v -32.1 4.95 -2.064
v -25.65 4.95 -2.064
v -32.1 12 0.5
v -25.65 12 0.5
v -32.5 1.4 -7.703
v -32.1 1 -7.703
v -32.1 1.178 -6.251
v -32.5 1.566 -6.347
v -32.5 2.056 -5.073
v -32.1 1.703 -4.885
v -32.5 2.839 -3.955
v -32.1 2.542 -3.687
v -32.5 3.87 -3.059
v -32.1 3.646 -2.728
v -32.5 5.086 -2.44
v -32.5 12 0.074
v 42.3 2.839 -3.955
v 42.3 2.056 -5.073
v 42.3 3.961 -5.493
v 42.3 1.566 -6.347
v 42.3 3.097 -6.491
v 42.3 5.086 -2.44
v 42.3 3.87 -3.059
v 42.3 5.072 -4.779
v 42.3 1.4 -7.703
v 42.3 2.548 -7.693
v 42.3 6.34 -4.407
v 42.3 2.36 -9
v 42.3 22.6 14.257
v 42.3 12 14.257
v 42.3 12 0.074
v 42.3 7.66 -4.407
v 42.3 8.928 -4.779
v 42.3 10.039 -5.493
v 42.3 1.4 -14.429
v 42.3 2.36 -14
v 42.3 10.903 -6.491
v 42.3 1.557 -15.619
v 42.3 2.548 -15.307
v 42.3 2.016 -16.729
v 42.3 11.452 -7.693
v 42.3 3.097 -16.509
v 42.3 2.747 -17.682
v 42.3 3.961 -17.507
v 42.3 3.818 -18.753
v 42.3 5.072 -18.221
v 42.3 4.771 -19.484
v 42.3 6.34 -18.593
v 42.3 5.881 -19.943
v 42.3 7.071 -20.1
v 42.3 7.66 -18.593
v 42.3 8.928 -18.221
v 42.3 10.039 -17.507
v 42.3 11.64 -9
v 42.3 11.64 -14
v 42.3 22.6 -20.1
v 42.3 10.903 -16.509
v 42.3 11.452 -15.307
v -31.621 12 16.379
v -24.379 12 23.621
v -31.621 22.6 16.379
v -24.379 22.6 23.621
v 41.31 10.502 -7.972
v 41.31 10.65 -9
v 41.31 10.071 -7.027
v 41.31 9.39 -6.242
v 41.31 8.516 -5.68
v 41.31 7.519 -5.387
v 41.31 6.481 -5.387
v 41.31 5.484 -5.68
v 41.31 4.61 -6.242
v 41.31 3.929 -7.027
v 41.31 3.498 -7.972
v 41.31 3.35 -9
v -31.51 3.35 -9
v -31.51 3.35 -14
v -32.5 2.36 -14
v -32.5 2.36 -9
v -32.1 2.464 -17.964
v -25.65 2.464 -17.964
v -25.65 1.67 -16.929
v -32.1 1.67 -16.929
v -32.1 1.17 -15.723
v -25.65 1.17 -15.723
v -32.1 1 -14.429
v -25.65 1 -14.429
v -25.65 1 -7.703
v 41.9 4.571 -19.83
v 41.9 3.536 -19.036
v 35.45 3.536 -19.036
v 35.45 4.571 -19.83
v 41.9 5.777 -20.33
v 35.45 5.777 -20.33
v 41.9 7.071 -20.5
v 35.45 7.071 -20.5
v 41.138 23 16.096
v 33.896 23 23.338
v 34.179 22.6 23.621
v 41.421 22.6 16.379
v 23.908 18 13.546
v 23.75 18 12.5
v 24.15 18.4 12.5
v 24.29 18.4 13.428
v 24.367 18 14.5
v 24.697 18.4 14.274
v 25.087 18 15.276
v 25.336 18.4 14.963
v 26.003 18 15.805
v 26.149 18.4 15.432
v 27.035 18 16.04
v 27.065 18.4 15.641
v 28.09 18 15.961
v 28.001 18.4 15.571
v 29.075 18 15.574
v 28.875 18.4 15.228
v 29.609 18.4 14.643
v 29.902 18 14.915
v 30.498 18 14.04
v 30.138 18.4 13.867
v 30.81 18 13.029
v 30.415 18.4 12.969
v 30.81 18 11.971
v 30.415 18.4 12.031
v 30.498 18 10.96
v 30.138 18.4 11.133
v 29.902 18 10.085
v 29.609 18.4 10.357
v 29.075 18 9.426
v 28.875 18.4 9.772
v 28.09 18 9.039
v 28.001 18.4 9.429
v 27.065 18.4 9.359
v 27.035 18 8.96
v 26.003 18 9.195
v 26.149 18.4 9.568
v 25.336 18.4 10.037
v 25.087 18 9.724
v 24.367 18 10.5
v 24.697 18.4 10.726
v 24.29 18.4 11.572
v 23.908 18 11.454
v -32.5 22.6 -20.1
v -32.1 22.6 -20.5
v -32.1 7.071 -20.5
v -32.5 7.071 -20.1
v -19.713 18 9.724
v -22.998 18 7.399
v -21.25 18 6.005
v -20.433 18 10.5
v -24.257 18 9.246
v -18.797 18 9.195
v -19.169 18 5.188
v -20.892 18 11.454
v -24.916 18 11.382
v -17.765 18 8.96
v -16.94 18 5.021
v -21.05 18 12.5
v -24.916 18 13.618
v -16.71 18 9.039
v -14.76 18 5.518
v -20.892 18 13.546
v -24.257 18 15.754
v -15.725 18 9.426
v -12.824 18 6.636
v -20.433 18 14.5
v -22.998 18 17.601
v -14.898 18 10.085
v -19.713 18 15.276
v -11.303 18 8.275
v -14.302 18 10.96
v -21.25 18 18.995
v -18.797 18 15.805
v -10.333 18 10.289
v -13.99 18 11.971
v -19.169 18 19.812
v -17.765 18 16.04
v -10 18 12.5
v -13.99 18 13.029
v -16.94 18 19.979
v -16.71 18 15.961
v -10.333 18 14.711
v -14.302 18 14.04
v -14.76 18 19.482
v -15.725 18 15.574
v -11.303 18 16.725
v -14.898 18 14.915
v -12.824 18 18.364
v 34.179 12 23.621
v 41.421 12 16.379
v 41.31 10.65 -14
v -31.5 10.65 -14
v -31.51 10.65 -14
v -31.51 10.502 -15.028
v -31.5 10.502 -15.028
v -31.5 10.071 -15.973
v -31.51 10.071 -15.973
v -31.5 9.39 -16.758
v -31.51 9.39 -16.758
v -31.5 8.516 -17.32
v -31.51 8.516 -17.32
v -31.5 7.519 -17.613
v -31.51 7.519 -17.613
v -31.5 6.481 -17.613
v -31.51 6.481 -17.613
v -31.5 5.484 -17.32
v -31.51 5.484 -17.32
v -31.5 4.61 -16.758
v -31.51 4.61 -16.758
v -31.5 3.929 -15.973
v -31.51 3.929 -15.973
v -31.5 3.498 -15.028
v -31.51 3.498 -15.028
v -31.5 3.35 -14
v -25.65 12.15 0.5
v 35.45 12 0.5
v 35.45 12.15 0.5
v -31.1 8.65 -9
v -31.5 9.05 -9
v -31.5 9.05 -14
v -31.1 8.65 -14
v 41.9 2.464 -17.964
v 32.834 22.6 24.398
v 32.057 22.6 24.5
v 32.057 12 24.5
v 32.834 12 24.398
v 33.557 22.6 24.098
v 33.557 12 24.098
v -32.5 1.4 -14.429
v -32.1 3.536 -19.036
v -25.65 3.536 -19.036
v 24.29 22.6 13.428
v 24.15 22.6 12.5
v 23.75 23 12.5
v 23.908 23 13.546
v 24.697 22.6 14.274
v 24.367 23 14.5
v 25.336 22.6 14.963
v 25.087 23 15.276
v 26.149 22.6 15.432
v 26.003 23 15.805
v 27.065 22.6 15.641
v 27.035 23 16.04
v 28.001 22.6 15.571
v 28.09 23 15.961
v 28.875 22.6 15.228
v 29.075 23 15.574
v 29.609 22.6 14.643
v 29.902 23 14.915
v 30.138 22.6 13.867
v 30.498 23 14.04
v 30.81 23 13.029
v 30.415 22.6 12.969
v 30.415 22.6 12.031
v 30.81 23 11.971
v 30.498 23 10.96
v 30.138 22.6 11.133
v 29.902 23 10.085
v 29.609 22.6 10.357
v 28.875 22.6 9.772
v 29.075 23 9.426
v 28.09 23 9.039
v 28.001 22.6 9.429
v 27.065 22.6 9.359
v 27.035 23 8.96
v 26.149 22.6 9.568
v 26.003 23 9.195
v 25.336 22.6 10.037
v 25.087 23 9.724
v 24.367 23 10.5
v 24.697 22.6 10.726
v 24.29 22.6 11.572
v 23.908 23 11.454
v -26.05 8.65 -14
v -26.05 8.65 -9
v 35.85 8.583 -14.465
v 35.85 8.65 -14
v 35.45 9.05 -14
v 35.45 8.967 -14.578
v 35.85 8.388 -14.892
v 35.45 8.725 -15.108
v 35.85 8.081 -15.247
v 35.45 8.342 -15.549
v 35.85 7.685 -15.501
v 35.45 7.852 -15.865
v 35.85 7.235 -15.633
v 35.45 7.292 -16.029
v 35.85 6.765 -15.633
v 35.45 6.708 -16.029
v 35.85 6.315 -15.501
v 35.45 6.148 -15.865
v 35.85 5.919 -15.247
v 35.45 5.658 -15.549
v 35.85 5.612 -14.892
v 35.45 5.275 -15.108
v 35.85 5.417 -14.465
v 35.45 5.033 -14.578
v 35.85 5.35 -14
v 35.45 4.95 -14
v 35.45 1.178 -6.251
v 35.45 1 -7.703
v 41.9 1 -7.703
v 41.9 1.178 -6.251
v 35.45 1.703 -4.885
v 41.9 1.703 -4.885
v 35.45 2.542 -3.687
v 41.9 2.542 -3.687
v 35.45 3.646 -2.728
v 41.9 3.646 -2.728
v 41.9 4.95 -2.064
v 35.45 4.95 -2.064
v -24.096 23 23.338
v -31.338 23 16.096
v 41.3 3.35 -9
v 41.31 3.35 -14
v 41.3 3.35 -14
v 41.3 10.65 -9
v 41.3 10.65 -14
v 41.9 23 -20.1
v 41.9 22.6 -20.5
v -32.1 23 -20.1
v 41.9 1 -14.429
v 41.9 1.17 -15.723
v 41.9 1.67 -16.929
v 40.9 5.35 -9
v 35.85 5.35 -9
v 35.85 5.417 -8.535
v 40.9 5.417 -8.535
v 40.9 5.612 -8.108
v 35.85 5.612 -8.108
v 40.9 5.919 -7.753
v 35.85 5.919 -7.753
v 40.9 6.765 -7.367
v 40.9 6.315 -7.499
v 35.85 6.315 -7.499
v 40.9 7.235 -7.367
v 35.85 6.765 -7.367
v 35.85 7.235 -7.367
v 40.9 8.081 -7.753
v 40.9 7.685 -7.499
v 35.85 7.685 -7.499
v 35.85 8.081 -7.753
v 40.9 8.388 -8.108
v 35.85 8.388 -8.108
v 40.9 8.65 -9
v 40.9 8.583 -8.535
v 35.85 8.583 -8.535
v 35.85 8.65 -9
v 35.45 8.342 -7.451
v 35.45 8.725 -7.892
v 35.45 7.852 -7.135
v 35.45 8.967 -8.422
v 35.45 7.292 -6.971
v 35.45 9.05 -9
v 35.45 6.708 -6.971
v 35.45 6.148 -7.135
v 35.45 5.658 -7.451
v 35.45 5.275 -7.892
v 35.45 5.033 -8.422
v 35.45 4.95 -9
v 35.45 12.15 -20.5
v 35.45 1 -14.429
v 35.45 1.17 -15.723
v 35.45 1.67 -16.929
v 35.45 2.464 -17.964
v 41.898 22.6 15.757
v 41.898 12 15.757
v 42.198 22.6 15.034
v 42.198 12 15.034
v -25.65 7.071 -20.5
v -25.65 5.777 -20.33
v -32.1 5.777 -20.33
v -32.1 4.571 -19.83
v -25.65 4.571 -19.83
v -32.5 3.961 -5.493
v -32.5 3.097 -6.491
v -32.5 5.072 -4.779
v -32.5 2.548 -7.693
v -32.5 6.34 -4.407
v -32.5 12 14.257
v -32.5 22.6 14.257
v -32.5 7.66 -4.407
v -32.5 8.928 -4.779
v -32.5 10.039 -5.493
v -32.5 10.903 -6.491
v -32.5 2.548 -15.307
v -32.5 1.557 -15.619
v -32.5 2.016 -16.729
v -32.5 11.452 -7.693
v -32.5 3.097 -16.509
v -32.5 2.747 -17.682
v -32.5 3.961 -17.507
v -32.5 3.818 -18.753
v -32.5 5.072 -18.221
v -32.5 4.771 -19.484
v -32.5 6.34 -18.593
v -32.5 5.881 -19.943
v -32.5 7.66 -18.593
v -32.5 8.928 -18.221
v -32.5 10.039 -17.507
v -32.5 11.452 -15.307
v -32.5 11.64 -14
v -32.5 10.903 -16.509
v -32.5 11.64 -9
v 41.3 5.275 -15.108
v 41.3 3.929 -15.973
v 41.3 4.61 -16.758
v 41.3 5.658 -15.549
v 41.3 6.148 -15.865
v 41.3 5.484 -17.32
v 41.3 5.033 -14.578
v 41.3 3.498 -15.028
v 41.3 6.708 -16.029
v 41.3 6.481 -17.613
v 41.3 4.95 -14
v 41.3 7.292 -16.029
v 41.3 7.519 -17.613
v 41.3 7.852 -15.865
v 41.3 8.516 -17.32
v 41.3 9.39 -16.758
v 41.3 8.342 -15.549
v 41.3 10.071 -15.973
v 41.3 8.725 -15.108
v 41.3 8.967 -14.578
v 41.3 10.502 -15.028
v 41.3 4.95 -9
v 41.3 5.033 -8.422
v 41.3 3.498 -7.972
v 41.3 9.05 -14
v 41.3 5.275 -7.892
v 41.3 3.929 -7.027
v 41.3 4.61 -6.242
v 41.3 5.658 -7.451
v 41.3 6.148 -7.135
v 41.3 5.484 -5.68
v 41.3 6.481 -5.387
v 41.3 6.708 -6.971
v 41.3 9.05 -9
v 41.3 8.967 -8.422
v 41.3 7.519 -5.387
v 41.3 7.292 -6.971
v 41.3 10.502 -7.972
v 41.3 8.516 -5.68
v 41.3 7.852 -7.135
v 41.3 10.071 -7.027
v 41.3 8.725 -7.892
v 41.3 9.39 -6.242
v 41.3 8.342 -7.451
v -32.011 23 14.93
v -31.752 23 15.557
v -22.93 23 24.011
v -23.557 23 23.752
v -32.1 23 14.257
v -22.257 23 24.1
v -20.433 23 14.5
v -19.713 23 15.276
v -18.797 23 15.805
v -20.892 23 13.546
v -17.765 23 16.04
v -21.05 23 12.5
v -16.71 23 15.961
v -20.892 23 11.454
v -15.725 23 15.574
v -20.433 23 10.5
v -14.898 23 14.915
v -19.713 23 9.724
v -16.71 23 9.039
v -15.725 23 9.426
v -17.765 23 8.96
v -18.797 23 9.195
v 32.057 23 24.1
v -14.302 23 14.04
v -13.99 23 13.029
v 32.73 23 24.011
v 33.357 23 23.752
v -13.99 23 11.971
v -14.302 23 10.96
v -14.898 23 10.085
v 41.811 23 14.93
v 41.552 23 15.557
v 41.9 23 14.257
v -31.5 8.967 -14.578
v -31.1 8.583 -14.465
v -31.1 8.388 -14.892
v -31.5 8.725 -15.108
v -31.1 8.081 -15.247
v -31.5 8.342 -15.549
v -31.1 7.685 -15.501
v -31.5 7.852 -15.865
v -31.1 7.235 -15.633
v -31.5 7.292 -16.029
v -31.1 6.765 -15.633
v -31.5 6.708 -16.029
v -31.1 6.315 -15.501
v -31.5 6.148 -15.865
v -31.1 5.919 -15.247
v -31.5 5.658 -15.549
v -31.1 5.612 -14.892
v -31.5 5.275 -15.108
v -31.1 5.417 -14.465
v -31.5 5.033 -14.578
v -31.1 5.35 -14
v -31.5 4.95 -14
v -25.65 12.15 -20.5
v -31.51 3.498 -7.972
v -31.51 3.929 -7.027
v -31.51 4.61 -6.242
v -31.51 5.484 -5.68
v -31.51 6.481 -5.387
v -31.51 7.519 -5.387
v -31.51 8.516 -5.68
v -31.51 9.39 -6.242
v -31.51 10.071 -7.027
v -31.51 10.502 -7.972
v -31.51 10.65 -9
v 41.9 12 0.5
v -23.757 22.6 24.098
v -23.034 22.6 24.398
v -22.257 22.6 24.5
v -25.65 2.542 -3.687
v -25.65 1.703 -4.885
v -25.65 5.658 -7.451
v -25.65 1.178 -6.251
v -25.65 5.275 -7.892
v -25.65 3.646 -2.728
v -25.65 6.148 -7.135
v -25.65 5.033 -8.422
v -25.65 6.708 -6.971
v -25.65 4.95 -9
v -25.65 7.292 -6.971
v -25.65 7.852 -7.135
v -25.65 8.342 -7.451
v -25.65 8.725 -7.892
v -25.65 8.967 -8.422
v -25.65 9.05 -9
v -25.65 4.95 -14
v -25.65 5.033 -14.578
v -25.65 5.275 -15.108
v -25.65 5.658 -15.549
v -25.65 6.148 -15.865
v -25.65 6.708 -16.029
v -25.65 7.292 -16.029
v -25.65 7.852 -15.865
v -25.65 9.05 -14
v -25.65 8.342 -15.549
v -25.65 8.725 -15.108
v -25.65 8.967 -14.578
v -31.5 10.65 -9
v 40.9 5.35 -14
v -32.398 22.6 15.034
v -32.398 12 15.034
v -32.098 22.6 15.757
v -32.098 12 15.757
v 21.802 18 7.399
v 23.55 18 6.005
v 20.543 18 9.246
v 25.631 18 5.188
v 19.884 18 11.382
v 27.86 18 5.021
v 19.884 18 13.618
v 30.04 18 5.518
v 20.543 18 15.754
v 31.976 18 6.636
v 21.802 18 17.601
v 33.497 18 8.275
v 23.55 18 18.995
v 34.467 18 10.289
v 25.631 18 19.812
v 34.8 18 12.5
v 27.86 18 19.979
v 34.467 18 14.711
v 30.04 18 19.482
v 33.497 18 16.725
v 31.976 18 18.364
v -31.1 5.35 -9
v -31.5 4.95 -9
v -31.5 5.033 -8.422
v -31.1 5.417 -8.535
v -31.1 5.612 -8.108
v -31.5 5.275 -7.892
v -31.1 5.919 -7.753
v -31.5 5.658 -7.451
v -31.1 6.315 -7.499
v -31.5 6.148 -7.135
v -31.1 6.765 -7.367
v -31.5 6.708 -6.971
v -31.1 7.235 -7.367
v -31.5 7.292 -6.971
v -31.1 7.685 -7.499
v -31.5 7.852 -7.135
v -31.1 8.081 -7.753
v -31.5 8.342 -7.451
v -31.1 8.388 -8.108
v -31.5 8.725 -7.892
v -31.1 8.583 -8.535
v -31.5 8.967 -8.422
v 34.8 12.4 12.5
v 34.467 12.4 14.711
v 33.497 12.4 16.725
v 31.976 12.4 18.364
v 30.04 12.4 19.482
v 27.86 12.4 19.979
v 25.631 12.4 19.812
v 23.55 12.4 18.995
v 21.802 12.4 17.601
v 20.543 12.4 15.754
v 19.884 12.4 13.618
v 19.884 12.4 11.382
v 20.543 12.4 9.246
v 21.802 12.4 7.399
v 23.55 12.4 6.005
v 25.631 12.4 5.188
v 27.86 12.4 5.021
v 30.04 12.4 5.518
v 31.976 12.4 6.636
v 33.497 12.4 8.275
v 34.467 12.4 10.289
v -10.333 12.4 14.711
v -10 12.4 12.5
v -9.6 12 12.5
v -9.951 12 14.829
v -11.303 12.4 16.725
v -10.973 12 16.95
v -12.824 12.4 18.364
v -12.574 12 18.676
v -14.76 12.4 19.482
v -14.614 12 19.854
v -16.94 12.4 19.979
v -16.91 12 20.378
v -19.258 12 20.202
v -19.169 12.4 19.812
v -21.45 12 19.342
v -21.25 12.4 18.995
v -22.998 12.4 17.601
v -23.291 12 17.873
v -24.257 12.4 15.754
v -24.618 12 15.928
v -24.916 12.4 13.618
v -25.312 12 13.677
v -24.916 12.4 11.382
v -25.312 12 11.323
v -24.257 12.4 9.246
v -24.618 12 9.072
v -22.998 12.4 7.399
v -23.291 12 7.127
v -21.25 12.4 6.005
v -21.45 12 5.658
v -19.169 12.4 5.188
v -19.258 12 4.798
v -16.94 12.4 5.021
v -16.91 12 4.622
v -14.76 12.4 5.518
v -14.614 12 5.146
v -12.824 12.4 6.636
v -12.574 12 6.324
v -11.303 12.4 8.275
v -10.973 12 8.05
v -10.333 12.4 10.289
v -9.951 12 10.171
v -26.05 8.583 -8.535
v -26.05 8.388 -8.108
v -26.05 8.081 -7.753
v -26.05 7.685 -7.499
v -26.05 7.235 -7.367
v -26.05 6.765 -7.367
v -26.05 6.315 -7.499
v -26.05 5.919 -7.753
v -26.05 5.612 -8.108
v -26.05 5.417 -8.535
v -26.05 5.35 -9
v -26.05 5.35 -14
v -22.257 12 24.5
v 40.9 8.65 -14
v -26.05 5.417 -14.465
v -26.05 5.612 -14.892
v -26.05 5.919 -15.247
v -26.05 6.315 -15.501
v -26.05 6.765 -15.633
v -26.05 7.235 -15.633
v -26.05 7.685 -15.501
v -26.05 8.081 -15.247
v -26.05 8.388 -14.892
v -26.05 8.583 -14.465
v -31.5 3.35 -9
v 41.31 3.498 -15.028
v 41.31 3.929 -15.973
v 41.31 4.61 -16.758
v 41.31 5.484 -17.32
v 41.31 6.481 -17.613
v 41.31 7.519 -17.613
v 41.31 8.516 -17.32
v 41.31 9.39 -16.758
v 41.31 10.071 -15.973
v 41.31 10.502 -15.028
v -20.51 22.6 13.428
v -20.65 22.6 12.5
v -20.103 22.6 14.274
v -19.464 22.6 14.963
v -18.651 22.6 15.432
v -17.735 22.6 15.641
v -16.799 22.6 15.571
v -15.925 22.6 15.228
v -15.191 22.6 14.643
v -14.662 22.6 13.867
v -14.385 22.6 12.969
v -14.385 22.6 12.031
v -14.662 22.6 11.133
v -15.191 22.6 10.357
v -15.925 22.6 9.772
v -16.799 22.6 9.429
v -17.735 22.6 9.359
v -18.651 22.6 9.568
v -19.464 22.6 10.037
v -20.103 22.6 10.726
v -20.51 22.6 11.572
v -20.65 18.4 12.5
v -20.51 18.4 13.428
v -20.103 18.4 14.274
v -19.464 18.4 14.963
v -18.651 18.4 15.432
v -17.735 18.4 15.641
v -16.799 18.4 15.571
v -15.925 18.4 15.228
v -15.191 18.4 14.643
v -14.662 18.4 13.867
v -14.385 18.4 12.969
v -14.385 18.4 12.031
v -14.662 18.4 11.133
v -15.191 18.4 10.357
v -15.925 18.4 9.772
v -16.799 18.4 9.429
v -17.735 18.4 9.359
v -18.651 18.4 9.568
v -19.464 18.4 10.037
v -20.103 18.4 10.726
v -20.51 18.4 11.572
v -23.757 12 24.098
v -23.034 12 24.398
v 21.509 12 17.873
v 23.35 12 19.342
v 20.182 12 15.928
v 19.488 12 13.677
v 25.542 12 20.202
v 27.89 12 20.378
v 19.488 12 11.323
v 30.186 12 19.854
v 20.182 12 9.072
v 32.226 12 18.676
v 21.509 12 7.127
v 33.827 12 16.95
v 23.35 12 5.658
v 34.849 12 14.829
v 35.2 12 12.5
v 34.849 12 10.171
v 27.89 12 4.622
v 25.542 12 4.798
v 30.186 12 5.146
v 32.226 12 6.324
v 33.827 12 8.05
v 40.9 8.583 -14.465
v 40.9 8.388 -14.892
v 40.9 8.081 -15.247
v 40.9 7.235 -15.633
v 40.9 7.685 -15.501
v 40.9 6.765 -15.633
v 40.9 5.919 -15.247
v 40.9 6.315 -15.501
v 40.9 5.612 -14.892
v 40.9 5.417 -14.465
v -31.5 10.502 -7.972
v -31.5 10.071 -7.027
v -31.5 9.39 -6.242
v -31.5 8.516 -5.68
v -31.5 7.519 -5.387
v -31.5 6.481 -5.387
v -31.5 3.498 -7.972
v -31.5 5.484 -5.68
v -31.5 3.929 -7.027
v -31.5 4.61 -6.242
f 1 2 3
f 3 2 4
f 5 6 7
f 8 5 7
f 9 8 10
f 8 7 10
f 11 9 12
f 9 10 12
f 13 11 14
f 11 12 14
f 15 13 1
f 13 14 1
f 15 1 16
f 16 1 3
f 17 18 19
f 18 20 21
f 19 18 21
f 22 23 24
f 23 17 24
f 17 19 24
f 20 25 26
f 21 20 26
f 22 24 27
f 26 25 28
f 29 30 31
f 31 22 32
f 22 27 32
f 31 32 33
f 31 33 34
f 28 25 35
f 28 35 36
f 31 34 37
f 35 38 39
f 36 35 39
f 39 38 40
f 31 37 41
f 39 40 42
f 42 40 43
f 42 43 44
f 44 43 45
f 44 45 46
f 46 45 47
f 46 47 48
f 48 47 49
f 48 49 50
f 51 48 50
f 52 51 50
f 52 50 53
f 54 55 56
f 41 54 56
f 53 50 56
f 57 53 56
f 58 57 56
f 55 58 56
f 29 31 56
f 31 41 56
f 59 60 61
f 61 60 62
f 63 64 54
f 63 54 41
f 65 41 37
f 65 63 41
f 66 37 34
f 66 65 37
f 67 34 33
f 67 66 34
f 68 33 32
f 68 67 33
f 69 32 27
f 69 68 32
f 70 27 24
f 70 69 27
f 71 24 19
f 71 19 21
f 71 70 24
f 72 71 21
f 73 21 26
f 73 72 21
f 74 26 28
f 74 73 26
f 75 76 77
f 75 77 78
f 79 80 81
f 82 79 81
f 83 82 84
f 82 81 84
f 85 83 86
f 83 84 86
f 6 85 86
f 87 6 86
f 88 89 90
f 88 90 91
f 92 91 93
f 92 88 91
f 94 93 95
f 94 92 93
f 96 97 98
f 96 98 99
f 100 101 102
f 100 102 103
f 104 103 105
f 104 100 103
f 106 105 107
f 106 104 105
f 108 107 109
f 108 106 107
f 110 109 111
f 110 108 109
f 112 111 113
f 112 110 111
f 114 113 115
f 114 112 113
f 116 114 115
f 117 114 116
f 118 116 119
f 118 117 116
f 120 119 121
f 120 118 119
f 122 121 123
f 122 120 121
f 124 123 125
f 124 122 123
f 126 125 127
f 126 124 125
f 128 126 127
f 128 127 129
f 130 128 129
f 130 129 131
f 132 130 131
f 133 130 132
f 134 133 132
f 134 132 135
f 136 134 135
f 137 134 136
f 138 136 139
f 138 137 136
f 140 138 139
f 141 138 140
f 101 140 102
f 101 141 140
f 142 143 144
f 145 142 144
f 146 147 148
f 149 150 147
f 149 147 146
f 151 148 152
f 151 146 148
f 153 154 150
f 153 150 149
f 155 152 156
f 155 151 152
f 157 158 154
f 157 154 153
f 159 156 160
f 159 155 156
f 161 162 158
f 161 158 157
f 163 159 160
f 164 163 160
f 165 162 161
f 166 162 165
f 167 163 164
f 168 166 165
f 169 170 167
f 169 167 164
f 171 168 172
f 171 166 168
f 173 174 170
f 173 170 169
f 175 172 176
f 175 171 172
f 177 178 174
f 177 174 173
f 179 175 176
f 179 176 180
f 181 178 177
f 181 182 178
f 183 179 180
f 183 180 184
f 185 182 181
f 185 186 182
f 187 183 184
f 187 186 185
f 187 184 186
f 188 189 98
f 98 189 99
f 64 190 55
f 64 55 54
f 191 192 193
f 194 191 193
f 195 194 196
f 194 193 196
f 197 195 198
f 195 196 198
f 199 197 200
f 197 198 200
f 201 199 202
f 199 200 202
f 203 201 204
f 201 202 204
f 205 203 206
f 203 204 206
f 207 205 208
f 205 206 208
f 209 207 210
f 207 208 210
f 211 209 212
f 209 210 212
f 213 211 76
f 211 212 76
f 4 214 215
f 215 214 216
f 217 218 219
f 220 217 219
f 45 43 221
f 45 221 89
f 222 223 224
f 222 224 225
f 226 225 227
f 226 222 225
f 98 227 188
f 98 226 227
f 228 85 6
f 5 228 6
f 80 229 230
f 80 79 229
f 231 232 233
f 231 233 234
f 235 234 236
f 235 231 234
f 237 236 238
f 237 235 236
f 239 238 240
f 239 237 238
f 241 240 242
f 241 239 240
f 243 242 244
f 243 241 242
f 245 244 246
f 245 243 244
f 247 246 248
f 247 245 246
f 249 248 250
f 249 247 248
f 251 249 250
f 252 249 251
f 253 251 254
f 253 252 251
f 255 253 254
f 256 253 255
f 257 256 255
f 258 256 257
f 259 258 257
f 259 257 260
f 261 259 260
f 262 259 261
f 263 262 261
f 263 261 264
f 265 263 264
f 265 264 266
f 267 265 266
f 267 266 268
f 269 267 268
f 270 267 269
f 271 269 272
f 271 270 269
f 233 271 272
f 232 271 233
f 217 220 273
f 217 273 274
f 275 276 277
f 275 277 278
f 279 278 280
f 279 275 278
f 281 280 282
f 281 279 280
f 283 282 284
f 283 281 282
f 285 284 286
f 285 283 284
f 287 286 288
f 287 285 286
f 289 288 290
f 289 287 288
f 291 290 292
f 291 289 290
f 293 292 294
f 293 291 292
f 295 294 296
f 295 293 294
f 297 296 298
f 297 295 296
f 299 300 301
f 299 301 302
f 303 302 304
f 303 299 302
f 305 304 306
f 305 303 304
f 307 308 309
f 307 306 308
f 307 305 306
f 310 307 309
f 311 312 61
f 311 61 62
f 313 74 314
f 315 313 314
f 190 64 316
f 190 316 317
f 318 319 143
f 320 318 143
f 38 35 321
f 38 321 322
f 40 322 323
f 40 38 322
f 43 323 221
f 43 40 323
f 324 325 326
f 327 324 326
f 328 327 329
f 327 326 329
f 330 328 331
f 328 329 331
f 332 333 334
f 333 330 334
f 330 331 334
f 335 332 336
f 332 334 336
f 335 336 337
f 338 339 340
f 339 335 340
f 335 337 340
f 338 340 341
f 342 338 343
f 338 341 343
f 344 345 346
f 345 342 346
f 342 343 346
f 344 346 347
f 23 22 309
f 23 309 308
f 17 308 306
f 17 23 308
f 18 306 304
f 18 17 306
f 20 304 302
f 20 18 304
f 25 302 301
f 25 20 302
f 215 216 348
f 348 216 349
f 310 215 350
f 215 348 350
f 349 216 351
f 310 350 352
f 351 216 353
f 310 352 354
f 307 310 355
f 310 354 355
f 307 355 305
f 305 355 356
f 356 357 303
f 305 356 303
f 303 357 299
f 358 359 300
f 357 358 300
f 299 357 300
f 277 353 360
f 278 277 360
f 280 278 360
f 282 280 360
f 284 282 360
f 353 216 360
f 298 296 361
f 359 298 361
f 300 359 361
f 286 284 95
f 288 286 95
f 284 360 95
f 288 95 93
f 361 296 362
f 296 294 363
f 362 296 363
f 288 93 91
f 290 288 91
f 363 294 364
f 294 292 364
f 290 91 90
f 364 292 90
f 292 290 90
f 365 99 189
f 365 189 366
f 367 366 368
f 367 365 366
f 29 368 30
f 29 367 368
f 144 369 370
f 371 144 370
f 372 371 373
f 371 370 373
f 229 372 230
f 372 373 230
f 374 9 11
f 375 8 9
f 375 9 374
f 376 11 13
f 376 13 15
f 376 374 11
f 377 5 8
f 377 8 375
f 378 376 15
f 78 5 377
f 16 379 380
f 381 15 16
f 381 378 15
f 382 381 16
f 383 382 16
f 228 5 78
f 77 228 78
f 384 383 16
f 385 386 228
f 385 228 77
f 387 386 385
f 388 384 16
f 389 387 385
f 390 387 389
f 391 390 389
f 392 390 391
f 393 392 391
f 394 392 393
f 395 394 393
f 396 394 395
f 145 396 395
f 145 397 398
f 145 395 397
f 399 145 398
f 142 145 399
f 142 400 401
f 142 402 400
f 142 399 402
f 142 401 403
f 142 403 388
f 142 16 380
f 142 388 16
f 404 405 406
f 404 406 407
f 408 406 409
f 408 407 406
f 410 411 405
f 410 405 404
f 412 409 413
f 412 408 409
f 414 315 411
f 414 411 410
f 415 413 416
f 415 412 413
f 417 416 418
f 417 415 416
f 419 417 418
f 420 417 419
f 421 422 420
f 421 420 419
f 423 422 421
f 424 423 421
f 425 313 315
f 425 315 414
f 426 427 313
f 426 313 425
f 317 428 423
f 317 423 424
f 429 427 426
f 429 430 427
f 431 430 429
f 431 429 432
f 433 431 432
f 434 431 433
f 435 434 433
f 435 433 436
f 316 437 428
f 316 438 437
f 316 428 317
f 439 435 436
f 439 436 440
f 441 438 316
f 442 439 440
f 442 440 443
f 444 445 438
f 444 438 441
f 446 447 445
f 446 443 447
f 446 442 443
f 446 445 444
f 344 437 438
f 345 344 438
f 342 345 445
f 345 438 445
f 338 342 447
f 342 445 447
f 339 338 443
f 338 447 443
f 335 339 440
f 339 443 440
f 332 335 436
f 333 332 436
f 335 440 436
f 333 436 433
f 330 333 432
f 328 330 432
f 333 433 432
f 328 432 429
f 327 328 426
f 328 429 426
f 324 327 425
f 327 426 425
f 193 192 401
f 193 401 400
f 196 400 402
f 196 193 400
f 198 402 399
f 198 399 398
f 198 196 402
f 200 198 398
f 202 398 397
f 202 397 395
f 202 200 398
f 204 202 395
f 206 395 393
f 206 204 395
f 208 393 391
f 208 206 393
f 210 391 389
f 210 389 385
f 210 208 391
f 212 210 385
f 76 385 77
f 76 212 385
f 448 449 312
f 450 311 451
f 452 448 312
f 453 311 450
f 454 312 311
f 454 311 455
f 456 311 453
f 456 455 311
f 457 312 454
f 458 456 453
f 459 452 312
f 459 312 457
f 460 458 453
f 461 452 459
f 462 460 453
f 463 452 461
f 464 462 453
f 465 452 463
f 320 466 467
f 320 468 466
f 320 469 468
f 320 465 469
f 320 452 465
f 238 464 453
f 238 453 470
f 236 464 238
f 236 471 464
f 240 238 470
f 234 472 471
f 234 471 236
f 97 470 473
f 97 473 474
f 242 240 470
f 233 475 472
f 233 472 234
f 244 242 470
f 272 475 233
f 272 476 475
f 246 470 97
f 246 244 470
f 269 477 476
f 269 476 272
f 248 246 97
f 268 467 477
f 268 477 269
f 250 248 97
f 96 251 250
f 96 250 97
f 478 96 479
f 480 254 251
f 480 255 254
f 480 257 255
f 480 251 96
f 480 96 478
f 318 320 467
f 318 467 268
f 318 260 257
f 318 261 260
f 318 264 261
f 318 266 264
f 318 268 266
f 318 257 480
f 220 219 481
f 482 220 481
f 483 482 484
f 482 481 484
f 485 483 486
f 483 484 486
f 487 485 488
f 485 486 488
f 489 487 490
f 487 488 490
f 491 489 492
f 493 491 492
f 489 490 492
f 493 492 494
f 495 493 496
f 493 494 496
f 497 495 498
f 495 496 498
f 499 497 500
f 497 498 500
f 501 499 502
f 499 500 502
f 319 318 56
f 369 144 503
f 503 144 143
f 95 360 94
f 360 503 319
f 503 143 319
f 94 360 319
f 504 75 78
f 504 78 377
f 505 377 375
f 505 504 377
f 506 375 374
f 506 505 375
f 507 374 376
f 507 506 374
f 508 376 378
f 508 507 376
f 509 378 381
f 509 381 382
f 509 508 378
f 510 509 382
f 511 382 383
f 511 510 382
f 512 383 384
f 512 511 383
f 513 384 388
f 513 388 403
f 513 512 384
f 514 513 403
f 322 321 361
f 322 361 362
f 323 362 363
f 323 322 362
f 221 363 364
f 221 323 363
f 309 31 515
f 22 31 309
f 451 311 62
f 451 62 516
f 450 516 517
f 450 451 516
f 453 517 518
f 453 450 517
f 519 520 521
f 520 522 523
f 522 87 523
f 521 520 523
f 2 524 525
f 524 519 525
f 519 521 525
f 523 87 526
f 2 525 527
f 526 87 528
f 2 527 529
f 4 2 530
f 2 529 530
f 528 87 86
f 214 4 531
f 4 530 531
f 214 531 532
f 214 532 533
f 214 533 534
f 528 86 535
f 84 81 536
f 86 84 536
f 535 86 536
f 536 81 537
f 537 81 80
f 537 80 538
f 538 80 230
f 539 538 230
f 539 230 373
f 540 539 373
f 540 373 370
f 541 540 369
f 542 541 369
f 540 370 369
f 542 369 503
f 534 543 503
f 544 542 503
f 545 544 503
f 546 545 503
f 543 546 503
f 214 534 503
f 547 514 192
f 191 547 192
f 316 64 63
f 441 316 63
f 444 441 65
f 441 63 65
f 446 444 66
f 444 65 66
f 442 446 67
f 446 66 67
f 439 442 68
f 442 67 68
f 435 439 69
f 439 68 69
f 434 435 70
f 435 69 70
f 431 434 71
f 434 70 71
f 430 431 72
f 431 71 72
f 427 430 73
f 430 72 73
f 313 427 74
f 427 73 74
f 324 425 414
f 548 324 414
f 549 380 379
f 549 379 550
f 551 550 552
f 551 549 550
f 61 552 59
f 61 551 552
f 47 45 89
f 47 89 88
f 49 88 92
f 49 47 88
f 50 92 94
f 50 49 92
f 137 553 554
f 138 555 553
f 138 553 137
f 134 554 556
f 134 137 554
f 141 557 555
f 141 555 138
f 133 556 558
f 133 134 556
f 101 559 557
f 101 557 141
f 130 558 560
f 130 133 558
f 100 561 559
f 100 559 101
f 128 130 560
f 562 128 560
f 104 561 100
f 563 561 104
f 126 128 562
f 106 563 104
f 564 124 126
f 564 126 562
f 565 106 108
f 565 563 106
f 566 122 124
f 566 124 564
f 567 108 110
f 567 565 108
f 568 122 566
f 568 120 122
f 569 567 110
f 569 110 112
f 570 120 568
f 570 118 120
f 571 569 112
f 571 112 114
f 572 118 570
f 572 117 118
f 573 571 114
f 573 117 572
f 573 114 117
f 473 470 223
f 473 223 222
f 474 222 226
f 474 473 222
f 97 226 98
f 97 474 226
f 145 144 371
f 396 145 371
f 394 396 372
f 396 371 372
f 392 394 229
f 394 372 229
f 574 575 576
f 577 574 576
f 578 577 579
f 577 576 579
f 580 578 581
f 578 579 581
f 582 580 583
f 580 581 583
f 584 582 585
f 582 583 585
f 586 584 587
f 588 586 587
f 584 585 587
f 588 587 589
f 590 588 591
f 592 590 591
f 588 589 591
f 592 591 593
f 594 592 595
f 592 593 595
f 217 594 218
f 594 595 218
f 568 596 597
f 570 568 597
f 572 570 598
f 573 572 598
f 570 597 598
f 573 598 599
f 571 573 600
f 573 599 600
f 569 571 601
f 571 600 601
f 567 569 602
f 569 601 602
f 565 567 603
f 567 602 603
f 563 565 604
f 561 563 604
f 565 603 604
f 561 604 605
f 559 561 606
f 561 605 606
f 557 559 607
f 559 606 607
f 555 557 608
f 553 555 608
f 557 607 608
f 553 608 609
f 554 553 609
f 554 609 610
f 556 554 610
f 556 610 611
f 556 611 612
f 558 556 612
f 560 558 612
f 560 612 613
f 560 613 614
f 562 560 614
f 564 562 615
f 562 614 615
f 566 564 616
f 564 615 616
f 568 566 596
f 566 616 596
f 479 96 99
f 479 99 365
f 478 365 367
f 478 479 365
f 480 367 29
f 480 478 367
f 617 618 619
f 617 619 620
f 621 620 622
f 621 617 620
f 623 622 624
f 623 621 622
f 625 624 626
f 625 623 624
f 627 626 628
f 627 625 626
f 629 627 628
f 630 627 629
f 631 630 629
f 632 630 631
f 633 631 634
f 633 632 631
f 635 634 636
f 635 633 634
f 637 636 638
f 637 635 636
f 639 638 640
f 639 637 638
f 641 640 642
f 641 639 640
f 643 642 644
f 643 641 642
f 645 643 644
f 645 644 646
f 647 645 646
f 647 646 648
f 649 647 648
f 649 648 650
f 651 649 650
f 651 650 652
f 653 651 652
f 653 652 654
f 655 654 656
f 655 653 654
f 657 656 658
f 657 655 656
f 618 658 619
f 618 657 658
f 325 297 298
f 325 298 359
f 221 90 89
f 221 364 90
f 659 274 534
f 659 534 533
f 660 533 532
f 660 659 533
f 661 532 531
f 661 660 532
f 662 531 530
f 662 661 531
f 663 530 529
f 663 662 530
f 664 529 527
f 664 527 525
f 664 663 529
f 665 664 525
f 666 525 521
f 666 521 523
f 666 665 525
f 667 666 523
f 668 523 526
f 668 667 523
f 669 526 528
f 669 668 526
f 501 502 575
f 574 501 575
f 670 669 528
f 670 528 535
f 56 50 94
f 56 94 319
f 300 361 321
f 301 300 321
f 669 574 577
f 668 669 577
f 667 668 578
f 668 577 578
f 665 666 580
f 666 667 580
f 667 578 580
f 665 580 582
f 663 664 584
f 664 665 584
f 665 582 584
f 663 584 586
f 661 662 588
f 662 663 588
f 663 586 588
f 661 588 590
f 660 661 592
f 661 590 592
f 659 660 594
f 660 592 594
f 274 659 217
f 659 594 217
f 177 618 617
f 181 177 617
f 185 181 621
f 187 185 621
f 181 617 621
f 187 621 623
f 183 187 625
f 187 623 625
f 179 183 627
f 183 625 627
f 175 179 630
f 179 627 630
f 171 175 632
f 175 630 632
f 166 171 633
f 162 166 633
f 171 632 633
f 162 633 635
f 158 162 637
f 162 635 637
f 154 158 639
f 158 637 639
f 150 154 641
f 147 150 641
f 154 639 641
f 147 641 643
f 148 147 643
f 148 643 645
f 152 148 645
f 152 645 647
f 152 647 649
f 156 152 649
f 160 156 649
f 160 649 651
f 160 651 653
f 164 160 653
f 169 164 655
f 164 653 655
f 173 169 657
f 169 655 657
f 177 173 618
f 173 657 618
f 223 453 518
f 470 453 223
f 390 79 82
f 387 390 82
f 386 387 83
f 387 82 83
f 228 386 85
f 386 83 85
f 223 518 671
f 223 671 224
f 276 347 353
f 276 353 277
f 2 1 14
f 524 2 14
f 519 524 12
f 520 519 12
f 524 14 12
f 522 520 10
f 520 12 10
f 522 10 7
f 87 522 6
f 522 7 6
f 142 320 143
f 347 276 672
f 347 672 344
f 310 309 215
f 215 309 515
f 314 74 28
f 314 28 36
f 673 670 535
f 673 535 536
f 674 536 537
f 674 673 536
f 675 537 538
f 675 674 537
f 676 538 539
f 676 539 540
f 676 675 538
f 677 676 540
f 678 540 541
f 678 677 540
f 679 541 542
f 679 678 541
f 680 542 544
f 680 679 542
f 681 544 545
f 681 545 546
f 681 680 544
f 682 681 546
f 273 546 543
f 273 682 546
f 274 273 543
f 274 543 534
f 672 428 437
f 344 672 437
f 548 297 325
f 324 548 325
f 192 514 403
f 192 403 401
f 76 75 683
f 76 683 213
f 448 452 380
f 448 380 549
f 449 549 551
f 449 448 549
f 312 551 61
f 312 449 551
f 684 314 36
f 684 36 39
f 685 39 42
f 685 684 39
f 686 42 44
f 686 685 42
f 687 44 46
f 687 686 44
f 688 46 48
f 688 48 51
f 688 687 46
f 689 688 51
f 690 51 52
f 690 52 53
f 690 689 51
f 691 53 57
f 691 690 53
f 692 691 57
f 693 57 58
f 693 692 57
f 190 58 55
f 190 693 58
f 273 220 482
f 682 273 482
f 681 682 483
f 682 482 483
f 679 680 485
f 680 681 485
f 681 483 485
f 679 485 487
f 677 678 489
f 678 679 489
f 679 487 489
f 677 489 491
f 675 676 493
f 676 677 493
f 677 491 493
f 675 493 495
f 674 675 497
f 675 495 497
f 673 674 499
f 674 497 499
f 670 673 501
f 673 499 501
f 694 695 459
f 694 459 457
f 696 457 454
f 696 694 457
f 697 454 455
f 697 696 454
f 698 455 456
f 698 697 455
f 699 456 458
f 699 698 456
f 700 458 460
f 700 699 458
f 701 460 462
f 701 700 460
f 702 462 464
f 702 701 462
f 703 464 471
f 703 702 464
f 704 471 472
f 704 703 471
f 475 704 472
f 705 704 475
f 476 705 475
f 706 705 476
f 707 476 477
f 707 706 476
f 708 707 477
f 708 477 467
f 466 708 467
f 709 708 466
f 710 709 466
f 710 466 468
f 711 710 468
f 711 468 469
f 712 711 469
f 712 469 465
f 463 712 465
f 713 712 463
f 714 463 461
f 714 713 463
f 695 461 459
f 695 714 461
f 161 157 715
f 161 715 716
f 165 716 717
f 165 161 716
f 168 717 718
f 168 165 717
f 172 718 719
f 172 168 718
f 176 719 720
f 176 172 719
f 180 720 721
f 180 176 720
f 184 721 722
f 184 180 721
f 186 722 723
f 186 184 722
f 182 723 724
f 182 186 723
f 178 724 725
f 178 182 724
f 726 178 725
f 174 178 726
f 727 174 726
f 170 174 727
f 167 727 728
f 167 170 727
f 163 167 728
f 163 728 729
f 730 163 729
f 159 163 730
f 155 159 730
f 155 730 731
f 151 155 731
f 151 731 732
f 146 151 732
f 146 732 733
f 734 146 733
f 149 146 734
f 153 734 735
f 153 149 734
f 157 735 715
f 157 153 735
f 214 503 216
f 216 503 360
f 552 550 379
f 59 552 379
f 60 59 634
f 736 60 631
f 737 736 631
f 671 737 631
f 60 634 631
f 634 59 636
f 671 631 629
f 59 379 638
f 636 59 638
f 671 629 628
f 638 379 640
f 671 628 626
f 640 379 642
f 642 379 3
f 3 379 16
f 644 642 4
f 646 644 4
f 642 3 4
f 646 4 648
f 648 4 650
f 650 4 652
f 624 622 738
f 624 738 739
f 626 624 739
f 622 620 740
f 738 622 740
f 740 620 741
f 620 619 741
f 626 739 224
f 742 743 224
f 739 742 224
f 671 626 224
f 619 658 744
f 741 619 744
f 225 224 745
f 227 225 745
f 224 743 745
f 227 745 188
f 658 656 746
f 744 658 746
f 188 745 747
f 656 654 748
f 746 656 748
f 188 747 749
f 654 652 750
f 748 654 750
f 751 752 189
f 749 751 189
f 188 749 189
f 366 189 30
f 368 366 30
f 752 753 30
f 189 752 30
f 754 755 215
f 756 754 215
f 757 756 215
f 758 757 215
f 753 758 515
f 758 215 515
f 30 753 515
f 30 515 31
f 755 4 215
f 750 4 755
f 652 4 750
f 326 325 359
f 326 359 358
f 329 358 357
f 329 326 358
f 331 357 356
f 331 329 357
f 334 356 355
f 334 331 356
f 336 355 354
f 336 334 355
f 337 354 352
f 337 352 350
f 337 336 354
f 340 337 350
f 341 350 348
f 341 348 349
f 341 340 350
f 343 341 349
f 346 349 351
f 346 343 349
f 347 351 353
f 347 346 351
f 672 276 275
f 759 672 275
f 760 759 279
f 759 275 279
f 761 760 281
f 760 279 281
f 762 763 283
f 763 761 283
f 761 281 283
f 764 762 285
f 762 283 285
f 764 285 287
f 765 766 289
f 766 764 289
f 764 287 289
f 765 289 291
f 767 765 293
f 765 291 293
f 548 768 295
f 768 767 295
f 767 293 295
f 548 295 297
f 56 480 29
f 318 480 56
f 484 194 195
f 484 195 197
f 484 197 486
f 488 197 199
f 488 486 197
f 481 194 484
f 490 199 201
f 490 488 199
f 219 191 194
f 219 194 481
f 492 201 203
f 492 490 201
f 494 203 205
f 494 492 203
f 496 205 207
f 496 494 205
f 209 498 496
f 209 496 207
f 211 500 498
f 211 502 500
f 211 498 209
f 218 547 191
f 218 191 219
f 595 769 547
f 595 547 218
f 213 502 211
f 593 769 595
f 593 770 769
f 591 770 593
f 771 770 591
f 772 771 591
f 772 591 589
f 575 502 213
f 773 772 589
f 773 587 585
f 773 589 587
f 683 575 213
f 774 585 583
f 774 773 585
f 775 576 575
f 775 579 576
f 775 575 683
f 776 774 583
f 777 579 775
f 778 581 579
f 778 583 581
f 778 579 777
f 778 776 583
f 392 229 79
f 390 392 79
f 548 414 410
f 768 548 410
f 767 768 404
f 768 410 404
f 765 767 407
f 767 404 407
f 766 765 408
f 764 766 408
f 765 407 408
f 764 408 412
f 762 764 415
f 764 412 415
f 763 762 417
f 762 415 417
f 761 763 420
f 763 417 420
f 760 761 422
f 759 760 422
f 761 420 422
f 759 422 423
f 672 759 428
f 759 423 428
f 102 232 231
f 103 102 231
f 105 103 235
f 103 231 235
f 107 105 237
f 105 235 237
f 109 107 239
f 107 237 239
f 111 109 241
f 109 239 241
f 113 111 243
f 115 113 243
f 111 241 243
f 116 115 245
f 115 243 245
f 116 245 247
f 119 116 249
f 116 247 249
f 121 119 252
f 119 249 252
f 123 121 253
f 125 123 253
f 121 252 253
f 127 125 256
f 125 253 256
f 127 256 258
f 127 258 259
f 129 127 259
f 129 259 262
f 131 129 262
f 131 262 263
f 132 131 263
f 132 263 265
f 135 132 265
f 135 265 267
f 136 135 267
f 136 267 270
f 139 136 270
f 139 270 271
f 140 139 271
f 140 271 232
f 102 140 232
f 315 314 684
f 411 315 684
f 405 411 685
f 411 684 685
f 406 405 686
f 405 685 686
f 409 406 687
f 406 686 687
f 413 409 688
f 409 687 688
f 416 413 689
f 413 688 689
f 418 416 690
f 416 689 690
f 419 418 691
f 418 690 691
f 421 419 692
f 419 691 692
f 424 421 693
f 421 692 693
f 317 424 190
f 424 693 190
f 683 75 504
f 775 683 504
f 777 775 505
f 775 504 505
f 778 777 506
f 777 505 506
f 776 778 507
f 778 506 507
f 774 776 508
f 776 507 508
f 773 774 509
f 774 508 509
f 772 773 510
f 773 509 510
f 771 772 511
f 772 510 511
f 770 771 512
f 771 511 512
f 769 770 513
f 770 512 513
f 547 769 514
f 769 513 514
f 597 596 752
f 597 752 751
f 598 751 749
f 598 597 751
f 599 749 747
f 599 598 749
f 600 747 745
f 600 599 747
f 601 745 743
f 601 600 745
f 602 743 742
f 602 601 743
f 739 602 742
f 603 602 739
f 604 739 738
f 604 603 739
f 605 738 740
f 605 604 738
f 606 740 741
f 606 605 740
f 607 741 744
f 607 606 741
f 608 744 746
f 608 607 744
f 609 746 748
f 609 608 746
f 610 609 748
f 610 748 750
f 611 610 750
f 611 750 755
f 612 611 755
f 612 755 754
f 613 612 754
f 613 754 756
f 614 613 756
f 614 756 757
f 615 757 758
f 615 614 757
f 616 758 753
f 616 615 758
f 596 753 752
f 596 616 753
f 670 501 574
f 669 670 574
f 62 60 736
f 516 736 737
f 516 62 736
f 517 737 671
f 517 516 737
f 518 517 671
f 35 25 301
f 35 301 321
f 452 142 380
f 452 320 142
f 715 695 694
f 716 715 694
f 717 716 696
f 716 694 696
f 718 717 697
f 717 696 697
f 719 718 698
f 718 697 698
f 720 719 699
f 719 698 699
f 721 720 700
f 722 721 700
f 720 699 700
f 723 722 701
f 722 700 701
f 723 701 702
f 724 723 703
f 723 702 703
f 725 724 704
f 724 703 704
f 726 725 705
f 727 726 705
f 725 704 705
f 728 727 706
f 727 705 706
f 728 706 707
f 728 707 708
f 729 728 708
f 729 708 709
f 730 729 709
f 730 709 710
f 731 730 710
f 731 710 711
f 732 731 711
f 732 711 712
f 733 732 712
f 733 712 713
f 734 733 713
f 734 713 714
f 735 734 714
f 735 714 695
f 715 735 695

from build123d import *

# Parameters (mm, degrees)
PAD008_DEPTH    = 21
POCKET020_DEPTH = 74.801
POCKET021_DEPTH = 1
CHAMFER008_SIZE = 0.99
POCKET022_DEPTH = 1
CHAMFER009_SIZE = 0.99
POCKET023_DEPTH = 74.801
CHAMFER010_SIZE = 4
FILLET003_R     = 6
FILLET004_R     = 5
SKETCH033_W     = 74.8
SKETCH033_H     = 11
PAD009_DEPTH    = 24
SKETCH034_R     = 3.15
POCKET024_DEPTH = 22.001
SKETCH035_R     = 7.5
POCKET025_DEPTH = 6
CHAMFER011_SIZE = 9
FILLET005_R     = 3
CHAMFER012_SIZE = 0.4


with BuildPart() as part:
    # Sketch028 → Pad008 (new body)
    with BuildSketch(Plane.XY):
        Polygon((-25.65, -11), (-25.65, 0.15), (35.45, 0.15), (35.45, -11), (42.3, -11), (42.3, 11), (-32.5, 11), (-32.5, -11), align=None)
    extrude(amount=PAD008_DEPTH)

    # Sketch029 (on Face7 of Pad008) → Pocket020 (cut, through all)
    with BuildSketch(Plane(origin=(-32.5, 0, 0), x_dir=(0, -1, 0), z_dir=(-1, 0, 0))):
        with BuildLine():
            ThreePointArc((3.35, 6.5), (5, 4.85), (6.65, 6.5))
            Line((6.65, 6.5), (6.65, 11.5))
            ThreePointArc((6.65, 11.5), (5, 13.15), (3.35, 11.5))
            Line((3.35, 6.5), (3.35, 11.5))
        make_face()
    extrude(amount=-POCKET020_DEPTH, mode=Mode.SUBTRACT)

    # Sketch030 (on Face10 of Pocket020) → Pocket021 (cut)
    with BuildSketch(Plane(origin=(-32.5, 0, 0), x_dir=(0, -1, 0), z_dir=(-1, 0, 0))):
        with BuildLine():
            ThreePointArc((8.65, 11.5), (5, 15.15), (1.35, 11.5))
            Line((1.35, 11.5), (1.35, 6.5))
            ThreePointArc((1.35, 6.5), (5, 2.85), (8.65, 6.5))
            Line((8.65, 11.5), (8.65, 6.5))
        make_face()
    extrude(amount=-POCKET021_DEPTH, mode=Mode.SUBTRACT)

    # Chamfer008
    chamfer008_edges = [part.edges().sort_by_distance(p)[0] for p in [
        (-32.5, -1.35, 9),
    ]]
    chamfer(chamfer008_edges, length=CHAMFER008_SIZE)

    # Sketch031 (on Face14 of Chamfer008) → Pocket022 (cut)
    with BuildSketch(Plane.YZ.offset(42.3)):
        with BuildLine():
            ThreePointArc((-1.35, 11.5), (-5, 15.15), (-8.65, 11.5))
            Line((-8.65, 11.5), (-8.65, 6.5))
            ThreePointArc((-8.65, 6.5), (-5, 2.85), (-1.35, 6.5))
            Line((-1.35, 11.5), (-1.35, 6.5))
        make_face()
    extrude(amount=-POCKET022_DEPTH, mode=Mode.SUBTRACT)

    # Chamfer009
    chamfer009_edges = [part.edges().sort_by_distance(p)[0] for p in [
        (42.3, -8.65, 9),
    ]]
    chamfer(chamfer009_edges, length=CHAMFER009_SIZE)

    # Sketch032 (on Face1 of Chamfer009) → Pocket023 (cut, through all)
    with BuildSketch(Plane.YZ.offset(42.3)):
        Polygon((0, 21), (-11, 21), (-11, 17), align=None)
    extrude(amount=-POCKET023_DEPTH, mode=Mode.SUBTRACT)

    # Chamfer010
    chamfer010_edges = [part.edges().sort_by_distance(p)[0] for p in [
        (38.875, -11, 0),
        (-29.075, -11, 0),
    ]]
    chamfer(chamfer010_edges, length=CHAMFER010_SIZE)

    # Fillet003
    fillet003_edges = [part.edges().sort_by_distance(p)[0] for p in [
        (-29.075, -11, 17),
        (38.875, -11, 17),
    ]]
    fillet(fillet003_edges, radius=FILLET003_R)

    # Fillet004
    fillet004_edges = [part.edges().sort_by_distance(p)[0] for p in [
        (-29.075, -11, 4),
        (-29.075, -7, 0),
        (38.875, -11, 4),
        (38.875, -7, 0),
    ]]
    fillet(fillet004_edges, radius=FILLET004_R)

    # Sketch033 (on Face8 of Fillet004) → Pad009 (join)
    with BuildSketch(Plane.XY.offset(21)):
        with Locations((4.9, 5.5)):
            Rectangle(SKETCH033_W, SKETCH033_H)
    extrude(amount=PAD009_DEPTH)

    # Sketch034 (on Face17 of Pad009) → Pocket024 (cut, through all)
    with BuildSketch(Plane(origin=(0, 11, 0), x_dir=(-1, 0, 0), z_dir=(0, 1, 0))):
        with Locations((-27.3, 33)):
            Circle(SKETCH034_R)
        with Locations((17.5, 33)):
            Circle(SKETCH034_R)
    extrude(amount=-POCKET024_DEPTH, mode=Mode.SUBTRACT)

    # Sketch035 (on Face16 of Pocket024) → Pocket025 (cut)
    with BuildSketch(Plane.XZ):
        with Locations((-17.5, 33)):
            Circle(SKETCH035_R)
        with Locations((27.3, 33)):
            Circle(SKETCH035_R)
    extrude(amount=-POCKET025_DEPTH, mode=Mode.SUBTRACT)

    # Chamfer011
    chamfer011_edges = [part.edges().sort_by_distance(p)[0] for p in [
        (-32.5, 5.5, 45),
        (42.3, 5.5, 45),
    ]]
    chamfer(chamfer011_edges, length=CHAMFER011_SIZE)

    # Fillet005
    fillet005_edges = [part.edges().sort_by_distance(p)[0] for p in [
        (-32.5, 5.5, 36),
        (-23.5, 5.5, 45),
        (33.3, 5.5, 45),
        (42.3, 5.5, 36),
    ]]
    fillet(fillet005_edges, radius=FILLET005_R)

    # Chamfer012
    chamfer012_edges = [part.edges().sort_by_distance(p)[0] for p in [
        (-32.271639, 11, 35.90541),
        (-28, 11, 40.5),
        (-23.40541, 11, 44.771639),
        (4.9, 11, 45),
        (33.20541, 11, 44.771639),
        (37.8, 11, 40.5),
        (42.071639, 11, 35.90541),
        (42.3, 11, 17.37868),
        (4.9, 11, 0),
        (-32.5, 11, 17.37868),
        (-14.35, 11, 33),
        (30.45, 11, 33),
        (-32.5, 3.035534, 0),
        (-25, 0, 33),
        (-14.35, 6, 33),
        (19.8, 0, 33),
        (30.45, 6, 33),
        (42.3, 3.035534, 0),
        (-25.65, -3.35, 9),
        (35.45, -3.35, 9),
        (-31.5, -3.35, 9),
        (41.3, -3.35, 9),
    ]]
    chamfer(chamfer012_edges, length=CHAMFER012_SIZE)


with BuildPart() as part_1:
    # Body004005 placement: moved
    add(part.part.moved(Location((0, 12, -20.5))))


solid = part_1.part
